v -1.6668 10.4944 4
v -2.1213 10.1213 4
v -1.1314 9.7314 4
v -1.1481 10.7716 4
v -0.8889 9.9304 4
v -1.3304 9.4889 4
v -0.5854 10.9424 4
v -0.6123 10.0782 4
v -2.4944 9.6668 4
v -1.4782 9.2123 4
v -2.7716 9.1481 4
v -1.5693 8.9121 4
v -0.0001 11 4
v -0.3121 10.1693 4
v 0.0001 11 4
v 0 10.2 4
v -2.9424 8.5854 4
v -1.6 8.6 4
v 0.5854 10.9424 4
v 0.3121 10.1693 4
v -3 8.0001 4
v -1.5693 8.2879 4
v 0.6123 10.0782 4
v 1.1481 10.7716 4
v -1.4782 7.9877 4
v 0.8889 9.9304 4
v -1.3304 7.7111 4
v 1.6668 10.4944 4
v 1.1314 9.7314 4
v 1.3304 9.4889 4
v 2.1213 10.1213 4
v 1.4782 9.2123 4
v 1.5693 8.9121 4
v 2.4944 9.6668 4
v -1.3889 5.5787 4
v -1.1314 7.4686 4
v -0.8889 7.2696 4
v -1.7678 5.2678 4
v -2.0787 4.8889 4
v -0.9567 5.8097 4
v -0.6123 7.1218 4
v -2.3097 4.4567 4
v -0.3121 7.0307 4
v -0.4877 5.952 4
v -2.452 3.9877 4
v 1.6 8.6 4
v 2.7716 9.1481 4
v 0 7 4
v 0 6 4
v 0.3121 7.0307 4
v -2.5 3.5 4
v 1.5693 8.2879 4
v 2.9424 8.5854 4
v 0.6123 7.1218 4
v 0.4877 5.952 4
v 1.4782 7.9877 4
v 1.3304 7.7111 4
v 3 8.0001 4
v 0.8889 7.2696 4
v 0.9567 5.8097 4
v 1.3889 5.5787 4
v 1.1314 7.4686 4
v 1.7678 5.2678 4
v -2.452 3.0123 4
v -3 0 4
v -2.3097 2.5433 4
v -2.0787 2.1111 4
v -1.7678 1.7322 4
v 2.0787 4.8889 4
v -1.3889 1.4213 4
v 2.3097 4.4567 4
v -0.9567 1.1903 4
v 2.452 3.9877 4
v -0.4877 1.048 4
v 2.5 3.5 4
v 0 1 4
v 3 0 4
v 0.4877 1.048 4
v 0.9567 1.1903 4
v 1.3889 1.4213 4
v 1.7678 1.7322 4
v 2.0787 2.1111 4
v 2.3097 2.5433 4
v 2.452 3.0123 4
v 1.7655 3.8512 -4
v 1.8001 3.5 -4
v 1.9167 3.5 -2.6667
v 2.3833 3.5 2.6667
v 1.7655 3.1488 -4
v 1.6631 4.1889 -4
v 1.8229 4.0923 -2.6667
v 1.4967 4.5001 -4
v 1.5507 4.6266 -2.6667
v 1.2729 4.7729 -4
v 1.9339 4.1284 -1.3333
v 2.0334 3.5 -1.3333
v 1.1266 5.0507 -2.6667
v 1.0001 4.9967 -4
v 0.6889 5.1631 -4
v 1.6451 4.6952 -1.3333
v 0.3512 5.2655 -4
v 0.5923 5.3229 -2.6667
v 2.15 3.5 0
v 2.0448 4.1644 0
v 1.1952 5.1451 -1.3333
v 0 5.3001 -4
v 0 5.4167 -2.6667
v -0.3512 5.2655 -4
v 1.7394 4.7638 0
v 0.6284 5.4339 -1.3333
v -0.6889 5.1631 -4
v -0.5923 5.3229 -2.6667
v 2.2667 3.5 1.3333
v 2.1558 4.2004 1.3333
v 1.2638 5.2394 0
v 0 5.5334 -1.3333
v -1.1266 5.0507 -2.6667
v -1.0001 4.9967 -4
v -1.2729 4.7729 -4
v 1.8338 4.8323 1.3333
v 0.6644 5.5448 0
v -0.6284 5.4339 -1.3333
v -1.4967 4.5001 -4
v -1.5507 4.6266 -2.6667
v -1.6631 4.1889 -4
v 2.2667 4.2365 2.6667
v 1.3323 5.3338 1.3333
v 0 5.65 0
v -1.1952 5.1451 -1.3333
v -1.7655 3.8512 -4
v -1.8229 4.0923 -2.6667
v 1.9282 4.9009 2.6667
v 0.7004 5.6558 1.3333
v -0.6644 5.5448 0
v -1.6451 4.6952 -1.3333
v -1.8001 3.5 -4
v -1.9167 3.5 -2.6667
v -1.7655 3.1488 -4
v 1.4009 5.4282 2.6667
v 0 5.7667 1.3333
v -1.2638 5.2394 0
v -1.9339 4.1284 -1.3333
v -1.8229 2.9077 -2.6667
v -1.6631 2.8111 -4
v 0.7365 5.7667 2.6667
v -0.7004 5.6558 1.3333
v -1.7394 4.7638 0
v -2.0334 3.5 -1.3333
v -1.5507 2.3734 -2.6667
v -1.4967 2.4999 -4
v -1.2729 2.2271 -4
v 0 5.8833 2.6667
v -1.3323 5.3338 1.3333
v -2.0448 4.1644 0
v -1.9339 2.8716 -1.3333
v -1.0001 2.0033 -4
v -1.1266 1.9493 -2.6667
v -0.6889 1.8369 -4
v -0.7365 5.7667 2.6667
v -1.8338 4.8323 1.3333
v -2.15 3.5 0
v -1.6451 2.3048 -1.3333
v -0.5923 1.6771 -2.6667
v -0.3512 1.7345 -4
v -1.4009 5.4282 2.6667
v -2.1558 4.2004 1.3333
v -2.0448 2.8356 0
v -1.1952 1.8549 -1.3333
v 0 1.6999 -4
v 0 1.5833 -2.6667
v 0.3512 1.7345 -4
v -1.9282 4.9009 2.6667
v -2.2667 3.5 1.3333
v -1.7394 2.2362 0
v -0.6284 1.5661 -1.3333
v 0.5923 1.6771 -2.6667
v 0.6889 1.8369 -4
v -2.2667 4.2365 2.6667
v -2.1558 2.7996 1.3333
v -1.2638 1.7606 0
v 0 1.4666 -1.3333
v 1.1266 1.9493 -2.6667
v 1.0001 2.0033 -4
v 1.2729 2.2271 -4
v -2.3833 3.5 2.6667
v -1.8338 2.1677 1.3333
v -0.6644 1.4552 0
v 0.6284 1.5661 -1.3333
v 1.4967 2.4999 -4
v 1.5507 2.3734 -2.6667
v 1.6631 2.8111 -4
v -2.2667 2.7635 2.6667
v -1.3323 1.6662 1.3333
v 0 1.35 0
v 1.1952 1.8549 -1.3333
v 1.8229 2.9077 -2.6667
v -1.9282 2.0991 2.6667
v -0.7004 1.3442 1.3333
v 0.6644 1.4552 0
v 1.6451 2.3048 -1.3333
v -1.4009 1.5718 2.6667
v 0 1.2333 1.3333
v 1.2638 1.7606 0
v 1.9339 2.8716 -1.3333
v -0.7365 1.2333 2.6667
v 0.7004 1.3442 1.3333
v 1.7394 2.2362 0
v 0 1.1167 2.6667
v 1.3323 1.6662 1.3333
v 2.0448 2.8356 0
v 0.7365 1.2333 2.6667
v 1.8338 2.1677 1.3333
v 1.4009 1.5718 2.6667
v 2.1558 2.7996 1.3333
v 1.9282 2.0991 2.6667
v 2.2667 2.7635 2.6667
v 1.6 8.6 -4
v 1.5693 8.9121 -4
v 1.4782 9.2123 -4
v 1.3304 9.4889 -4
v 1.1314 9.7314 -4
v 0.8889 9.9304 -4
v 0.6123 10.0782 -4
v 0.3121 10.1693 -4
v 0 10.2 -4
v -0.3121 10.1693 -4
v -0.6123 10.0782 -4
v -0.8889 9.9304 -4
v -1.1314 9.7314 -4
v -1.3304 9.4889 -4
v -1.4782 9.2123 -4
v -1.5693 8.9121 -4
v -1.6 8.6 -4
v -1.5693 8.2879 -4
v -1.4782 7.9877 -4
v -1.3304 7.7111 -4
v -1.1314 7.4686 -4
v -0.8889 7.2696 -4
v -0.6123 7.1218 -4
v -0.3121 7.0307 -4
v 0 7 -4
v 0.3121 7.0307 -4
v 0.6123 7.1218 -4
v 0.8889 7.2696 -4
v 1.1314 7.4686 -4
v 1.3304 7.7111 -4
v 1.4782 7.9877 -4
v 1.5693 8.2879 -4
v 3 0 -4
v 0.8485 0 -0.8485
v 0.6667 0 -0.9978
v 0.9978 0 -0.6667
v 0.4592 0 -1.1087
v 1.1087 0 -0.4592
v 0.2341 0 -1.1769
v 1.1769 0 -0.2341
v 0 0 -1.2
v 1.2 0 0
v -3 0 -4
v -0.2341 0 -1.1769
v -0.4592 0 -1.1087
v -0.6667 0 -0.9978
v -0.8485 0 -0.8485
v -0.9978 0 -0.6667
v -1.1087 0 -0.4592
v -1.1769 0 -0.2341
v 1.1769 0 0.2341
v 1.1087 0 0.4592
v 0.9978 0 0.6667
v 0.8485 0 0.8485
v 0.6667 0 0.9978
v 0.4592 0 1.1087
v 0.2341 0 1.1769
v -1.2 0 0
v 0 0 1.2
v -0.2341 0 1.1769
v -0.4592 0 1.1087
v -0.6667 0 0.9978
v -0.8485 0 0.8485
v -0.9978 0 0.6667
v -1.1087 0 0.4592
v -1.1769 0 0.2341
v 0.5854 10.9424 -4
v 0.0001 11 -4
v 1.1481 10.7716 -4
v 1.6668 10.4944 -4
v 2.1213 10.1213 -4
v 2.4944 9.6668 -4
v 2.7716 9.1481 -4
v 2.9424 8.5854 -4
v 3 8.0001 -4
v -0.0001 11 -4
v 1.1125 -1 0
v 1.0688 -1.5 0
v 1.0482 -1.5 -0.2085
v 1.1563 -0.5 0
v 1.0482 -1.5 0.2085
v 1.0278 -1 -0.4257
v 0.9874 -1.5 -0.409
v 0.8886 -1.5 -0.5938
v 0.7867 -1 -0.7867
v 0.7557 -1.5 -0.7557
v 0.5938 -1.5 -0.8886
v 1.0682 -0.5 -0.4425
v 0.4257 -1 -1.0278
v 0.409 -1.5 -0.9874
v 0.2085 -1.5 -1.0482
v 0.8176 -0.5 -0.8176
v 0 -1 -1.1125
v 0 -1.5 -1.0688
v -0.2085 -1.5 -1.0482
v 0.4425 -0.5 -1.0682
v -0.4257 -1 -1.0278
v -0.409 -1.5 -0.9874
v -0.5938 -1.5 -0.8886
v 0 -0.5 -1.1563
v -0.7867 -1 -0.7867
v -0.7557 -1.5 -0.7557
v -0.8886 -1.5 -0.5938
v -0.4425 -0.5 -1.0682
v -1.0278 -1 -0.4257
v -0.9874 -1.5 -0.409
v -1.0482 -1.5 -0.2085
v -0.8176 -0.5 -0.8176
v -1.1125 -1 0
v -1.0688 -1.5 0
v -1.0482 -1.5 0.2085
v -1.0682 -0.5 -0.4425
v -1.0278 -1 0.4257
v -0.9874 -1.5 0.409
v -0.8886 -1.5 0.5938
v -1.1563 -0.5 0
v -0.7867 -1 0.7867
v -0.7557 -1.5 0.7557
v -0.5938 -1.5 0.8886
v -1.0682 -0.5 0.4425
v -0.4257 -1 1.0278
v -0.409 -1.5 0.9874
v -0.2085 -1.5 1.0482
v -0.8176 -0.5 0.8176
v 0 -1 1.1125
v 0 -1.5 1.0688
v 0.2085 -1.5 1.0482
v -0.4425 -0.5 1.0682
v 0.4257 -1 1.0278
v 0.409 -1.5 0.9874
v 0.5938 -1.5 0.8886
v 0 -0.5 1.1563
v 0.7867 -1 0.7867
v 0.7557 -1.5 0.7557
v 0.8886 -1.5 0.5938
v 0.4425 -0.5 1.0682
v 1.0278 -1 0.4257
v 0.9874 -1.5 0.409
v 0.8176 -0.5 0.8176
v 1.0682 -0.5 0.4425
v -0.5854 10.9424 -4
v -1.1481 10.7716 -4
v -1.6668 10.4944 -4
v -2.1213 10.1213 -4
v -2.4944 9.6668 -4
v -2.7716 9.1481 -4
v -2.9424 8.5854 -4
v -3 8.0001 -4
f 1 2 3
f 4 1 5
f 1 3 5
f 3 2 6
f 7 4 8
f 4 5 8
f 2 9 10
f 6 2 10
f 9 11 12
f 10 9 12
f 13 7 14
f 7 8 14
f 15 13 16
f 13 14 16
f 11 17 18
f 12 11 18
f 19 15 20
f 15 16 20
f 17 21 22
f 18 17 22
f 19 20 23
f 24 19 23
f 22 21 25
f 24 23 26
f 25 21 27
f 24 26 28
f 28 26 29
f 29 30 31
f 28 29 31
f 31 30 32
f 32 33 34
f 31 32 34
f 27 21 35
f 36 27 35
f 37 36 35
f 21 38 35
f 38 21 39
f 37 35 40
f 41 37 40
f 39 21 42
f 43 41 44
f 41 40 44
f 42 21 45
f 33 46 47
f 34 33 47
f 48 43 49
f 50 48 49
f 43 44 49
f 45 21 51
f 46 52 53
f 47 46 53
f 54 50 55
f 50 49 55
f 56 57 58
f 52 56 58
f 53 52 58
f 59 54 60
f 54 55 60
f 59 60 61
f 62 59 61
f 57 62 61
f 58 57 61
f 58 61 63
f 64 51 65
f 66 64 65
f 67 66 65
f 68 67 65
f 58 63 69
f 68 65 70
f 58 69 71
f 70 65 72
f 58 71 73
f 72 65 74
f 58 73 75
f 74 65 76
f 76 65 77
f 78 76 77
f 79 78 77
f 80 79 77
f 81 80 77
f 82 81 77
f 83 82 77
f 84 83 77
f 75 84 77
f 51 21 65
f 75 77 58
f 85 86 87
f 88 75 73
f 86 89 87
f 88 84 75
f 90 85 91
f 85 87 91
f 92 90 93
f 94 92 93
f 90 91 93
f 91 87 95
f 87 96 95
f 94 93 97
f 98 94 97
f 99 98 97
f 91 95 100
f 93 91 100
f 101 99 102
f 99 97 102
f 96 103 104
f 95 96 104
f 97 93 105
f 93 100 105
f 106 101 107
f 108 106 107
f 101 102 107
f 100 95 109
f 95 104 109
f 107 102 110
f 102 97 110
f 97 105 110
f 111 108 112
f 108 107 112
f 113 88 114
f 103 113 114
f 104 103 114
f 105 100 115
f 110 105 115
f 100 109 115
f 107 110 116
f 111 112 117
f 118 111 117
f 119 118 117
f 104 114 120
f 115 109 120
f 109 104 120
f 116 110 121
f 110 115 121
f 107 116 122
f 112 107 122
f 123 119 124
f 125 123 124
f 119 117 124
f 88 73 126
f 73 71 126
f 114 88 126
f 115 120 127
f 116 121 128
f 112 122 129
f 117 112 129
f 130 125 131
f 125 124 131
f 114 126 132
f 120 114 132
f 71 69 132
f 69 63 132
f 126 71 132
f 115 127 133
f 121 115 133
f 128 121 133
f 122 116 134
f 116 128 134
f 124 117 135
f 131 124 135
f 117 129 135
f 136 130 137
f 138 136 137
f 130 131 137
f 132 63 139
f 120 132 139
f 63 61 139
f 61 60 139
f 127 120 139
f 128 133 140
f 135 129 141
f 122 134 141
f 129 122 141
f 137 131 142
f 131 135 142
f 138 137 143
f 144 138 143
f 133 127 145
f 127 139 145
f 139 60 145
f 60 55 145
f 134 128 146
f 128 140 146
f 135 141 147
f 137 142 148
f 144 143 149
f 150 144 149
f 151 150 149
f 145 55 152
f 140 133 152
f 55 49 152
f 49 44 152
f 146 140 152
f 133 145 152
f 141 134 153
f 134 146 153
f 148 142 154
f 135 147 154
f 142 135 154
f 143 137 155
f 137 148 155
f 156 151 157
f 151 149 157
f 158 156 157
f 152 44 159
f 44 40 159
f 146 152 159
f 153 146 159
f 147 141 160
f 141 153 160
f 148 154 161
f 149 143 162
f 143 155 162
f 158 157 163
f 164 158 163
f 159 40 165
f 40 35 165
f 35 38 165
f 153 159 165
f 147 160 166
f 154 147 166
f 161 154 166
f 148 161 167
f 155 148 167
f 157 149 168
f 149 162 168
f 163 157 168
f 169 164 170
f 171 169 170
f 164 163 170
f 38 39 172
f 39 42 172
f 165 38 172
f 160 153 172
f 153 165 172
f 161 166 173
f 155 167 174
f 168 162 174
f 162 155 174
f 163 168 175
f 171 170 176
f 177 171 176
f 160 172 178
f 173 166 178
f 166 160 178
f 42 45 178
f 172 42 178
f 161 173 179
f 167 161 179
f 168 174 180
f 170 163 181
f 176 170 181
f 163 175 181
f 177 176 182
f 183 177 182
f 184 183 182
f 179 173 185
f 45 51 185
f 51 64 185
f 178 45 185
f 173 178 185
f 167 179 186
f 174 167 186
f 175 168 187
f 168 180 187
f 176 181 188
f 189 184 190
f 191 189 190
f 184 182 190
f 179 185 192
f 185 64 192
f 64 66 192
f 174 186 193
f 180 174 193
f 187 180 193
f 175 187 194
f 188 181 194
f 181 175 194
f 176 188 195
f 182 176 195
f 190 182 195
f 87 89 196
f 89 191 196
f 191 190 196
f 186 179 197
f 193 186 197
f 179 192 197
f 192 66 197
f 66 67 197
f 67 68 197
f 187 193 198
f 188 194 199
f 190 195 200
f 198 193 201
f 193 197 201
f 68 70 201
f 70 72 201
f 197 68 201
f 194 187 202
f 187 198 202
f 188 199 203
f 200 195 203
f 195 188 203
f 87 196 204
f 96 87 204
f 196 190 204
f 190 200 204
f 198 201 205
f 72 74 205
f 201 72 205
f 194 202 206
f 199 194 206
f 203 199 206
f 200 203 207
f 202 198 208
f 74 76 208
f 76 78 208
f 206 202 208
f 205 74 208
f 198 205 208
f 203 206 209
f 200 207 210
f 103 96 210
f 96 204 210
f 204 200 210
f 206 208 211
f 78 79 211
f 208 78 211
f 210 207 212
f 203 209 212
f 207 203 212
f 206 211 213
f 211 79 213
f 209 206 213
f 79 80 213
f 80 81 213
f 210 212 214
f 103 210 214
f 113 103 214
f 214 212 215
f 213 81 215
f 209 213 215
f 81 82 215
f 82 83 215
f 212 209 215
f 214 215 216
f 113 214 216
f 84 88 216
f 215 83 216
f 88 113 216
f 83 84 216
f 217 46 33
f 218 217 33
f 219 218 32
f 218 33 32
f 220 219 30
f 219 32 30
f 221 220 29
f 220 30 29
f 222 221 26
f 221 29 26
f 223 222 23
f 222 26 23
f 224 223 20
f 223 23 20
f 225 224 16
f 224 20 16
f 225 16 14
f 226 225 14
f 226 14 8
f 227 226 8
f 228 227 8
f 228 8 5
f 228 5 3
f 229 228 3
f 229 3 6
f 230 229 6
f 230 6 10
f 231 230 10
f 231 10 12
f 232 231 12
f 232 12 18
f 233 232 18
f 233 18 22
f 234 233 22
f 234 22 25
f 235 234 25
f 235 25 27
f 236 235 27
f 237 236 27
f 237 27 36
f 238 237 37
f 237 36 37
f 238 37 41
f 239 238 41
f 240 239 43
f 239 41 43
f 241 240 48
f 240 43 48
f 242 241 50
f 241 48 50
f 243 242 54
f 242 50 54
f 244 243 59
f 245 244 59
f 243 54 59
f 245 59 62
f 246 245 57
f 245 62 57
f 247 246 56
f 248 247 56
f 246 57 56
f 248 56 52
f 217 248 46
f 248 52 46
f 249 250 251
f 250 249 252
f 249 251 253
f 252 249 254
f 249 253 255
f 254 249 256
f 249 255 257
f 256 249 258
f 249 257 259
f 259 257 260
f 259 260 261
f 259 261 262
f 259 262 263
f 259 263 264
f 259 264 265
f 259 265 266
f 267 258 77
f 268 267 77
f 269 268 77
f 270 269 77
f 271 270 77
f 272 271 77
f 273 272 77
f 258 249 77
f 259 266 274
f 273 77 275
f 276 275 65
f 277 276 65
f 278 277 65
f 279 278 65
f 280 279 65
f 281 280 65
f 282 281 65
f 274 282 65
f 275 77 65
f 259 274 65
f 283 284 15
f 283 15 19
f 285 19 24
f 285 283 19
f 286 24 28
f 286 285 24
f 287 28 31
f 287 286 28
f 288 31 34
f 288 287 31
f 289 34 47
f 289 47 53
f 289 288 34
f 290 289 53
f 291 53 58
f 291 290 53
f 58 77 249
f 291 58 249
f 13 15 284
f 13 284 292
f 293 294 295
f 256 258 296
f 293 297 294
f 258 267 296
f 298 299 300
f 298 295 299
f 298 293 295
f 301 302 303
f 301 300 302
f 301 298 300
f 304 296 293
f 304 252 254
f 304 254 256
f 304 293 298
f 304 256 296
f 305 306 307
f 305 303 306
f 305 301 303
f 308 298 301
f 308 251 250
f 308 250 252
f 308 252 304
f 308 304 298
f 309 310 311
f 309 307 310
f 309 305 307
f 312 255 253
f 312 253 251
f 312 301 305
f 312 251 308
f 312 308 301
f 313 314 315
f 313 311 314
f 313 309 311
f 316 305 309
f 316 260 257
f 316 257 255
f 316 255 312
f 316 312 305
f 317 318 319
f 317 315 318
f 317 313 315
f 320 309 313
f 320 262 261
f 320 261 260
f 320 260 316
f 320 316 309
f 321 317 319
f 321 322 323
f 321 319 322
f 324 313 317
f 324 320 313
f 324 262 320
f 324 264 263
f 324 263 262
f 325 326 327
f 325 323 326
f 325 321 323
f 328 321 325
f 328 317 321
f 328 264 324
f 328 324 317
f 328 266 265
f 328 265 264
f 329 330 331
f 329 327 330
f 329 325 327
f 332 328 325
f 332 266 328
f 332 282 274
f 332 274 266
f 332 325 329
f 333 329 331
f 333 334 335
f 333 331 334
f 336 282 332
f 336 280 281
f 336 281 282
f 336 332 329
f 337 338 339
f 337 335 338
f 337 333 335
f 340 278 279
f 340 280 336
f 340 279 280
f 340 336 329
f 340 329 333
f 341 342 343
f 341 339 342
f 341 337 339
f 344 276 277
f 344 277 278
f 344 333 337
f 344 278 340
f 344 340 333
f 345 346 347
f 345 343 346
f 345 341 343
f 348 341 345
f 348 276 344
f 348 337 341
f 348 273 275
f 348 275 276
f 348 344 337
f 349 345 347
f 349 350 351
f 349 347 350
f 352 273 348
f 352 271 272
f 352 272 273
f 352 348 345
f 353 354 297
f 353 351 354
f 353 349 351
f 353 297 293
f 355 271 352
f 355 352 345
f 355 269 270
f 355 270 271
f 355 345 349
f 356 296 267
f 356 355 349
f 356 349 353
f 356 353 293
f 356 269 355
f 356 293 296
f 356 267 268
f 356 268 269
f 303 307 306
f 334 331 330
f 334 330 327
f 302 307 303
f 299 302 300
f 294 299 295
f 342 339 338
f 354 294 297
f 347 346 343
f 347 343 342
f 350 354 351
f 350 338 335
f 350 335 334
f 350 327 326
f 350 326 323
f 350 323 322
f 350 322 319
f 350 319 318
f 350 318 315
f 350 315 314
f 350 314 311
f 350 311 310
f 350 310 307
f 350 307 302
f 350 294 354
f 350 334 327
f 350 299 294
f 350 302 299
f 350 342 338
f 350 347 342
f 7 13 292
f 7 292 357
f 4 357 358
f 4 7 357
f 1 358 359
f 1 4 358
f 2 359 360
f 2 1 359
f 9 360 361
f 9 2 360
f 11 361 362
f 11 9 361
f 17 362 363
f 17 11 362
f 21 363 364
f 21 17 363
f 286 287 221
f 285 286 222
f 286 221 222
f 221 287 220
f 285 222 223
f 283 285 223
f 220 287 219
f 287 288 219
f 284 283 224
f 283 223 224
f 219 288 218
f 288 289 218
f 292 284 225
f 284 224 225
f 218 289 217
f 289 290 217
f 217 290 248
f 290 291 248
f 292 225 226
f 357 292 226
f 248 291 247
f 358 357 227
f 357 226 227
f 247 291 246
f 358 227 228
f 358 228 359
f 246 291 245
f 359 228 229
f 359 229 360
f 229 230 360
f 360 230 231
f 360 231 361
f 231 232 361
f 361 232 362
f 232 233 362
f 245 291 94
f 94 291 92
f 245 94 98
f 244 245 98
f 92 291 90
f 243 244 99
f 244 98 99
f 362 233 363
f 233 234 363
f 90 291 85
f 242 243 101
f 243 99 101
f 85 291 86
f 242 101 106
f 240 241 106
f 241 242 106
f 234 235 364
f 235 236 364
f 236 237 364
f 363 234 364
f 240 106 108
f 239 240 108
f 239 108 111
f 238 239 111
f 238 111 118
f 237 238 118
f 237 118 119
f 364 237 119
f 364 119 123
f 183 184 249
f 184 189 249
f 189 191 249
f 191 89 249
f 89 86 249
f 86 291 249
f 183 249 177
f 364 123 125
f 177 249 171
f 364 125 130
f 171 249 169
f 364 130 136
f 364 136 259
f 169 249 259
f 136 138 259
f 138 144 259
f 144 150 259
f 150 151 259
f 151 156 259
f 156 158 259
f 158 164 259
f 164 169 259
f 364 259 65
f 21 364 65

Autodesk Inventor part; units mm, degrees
ref_plane "YZ Plane" through (0, 0, 0) normal (1, 0, 0) x (0, 1, 0)
ref_plane "XZ Plane" through (0, 0, 0) normal (0, 1, 0) x (-1, 0, 0)
ref_plane "XY Plane" through (0, 0, 0) normal (0, 0, 1) x (1, 0, 0)
sketch "Szkic3" plane through (0, 0, 0) normal (0, 1, 0) x (-1, 0, 0)
  line L0 (3, 4) -> (-3, 4)
  line L1 (-3, 4) -> (-3, -4)
  line L2 (-3, -4) -> (3, -4)
  line L3 (3, -4) -> (3, 4)
  line L4 (3, 4) -> (-3, -4) construction
  line L5 (-3, 4) -> (3, -4) construction
  point P0 (0, 0)
  dimension "d8" = 6
  dimension "d9" = 8
extrude "Wyciągnięcie proste2" add sketch "Szkic3" along normal blind 11
sketch "Szkic4" plane through (-3, 0, 4) normal (0, 0, 1) x (1, 0, 0)
  circle A0 centre (3, 3.5) radius 2.5
  line L0 (6, 0) -> (6, 11) projected
  line L1 (0, 0) -> (0, 11) projected
  circle A1 centre (3, 8.6) radius 1.6
  point P0 (3, 0)
  dimension "d12" = 5
  dimension "d13" = 3
  dimension "d14" = 3
  dimension "d15" = 3.5
  dimension "d16" = 3.2
  dimension "d17" = 5.1
extrude "Wyciągnięcie proste3" cut sketch "Szkic4" against normal up to next contours A1
extrude "Wyciągnięcie proste4" cut sketch "Szkic4" against normal up to next draft -5 contours A0
sketch "Szkic5" plane through (0, 0, 0) normal (0, -1, 0) x (1, 0, 0)
  circle A0 centre (0, 0) radius 1.2
  dimension "d22" = 2.4
extrude "Wyciągnięcie proste5" add sketch "Szkic5" along normal blind 1.5 draft -5
fillet "Fillet2" radius 3 2 edges at (-3, 11, 0) (3, 11, 0)
equation "\"d14\" = d13"
properties part number "mocowanieDiod"
